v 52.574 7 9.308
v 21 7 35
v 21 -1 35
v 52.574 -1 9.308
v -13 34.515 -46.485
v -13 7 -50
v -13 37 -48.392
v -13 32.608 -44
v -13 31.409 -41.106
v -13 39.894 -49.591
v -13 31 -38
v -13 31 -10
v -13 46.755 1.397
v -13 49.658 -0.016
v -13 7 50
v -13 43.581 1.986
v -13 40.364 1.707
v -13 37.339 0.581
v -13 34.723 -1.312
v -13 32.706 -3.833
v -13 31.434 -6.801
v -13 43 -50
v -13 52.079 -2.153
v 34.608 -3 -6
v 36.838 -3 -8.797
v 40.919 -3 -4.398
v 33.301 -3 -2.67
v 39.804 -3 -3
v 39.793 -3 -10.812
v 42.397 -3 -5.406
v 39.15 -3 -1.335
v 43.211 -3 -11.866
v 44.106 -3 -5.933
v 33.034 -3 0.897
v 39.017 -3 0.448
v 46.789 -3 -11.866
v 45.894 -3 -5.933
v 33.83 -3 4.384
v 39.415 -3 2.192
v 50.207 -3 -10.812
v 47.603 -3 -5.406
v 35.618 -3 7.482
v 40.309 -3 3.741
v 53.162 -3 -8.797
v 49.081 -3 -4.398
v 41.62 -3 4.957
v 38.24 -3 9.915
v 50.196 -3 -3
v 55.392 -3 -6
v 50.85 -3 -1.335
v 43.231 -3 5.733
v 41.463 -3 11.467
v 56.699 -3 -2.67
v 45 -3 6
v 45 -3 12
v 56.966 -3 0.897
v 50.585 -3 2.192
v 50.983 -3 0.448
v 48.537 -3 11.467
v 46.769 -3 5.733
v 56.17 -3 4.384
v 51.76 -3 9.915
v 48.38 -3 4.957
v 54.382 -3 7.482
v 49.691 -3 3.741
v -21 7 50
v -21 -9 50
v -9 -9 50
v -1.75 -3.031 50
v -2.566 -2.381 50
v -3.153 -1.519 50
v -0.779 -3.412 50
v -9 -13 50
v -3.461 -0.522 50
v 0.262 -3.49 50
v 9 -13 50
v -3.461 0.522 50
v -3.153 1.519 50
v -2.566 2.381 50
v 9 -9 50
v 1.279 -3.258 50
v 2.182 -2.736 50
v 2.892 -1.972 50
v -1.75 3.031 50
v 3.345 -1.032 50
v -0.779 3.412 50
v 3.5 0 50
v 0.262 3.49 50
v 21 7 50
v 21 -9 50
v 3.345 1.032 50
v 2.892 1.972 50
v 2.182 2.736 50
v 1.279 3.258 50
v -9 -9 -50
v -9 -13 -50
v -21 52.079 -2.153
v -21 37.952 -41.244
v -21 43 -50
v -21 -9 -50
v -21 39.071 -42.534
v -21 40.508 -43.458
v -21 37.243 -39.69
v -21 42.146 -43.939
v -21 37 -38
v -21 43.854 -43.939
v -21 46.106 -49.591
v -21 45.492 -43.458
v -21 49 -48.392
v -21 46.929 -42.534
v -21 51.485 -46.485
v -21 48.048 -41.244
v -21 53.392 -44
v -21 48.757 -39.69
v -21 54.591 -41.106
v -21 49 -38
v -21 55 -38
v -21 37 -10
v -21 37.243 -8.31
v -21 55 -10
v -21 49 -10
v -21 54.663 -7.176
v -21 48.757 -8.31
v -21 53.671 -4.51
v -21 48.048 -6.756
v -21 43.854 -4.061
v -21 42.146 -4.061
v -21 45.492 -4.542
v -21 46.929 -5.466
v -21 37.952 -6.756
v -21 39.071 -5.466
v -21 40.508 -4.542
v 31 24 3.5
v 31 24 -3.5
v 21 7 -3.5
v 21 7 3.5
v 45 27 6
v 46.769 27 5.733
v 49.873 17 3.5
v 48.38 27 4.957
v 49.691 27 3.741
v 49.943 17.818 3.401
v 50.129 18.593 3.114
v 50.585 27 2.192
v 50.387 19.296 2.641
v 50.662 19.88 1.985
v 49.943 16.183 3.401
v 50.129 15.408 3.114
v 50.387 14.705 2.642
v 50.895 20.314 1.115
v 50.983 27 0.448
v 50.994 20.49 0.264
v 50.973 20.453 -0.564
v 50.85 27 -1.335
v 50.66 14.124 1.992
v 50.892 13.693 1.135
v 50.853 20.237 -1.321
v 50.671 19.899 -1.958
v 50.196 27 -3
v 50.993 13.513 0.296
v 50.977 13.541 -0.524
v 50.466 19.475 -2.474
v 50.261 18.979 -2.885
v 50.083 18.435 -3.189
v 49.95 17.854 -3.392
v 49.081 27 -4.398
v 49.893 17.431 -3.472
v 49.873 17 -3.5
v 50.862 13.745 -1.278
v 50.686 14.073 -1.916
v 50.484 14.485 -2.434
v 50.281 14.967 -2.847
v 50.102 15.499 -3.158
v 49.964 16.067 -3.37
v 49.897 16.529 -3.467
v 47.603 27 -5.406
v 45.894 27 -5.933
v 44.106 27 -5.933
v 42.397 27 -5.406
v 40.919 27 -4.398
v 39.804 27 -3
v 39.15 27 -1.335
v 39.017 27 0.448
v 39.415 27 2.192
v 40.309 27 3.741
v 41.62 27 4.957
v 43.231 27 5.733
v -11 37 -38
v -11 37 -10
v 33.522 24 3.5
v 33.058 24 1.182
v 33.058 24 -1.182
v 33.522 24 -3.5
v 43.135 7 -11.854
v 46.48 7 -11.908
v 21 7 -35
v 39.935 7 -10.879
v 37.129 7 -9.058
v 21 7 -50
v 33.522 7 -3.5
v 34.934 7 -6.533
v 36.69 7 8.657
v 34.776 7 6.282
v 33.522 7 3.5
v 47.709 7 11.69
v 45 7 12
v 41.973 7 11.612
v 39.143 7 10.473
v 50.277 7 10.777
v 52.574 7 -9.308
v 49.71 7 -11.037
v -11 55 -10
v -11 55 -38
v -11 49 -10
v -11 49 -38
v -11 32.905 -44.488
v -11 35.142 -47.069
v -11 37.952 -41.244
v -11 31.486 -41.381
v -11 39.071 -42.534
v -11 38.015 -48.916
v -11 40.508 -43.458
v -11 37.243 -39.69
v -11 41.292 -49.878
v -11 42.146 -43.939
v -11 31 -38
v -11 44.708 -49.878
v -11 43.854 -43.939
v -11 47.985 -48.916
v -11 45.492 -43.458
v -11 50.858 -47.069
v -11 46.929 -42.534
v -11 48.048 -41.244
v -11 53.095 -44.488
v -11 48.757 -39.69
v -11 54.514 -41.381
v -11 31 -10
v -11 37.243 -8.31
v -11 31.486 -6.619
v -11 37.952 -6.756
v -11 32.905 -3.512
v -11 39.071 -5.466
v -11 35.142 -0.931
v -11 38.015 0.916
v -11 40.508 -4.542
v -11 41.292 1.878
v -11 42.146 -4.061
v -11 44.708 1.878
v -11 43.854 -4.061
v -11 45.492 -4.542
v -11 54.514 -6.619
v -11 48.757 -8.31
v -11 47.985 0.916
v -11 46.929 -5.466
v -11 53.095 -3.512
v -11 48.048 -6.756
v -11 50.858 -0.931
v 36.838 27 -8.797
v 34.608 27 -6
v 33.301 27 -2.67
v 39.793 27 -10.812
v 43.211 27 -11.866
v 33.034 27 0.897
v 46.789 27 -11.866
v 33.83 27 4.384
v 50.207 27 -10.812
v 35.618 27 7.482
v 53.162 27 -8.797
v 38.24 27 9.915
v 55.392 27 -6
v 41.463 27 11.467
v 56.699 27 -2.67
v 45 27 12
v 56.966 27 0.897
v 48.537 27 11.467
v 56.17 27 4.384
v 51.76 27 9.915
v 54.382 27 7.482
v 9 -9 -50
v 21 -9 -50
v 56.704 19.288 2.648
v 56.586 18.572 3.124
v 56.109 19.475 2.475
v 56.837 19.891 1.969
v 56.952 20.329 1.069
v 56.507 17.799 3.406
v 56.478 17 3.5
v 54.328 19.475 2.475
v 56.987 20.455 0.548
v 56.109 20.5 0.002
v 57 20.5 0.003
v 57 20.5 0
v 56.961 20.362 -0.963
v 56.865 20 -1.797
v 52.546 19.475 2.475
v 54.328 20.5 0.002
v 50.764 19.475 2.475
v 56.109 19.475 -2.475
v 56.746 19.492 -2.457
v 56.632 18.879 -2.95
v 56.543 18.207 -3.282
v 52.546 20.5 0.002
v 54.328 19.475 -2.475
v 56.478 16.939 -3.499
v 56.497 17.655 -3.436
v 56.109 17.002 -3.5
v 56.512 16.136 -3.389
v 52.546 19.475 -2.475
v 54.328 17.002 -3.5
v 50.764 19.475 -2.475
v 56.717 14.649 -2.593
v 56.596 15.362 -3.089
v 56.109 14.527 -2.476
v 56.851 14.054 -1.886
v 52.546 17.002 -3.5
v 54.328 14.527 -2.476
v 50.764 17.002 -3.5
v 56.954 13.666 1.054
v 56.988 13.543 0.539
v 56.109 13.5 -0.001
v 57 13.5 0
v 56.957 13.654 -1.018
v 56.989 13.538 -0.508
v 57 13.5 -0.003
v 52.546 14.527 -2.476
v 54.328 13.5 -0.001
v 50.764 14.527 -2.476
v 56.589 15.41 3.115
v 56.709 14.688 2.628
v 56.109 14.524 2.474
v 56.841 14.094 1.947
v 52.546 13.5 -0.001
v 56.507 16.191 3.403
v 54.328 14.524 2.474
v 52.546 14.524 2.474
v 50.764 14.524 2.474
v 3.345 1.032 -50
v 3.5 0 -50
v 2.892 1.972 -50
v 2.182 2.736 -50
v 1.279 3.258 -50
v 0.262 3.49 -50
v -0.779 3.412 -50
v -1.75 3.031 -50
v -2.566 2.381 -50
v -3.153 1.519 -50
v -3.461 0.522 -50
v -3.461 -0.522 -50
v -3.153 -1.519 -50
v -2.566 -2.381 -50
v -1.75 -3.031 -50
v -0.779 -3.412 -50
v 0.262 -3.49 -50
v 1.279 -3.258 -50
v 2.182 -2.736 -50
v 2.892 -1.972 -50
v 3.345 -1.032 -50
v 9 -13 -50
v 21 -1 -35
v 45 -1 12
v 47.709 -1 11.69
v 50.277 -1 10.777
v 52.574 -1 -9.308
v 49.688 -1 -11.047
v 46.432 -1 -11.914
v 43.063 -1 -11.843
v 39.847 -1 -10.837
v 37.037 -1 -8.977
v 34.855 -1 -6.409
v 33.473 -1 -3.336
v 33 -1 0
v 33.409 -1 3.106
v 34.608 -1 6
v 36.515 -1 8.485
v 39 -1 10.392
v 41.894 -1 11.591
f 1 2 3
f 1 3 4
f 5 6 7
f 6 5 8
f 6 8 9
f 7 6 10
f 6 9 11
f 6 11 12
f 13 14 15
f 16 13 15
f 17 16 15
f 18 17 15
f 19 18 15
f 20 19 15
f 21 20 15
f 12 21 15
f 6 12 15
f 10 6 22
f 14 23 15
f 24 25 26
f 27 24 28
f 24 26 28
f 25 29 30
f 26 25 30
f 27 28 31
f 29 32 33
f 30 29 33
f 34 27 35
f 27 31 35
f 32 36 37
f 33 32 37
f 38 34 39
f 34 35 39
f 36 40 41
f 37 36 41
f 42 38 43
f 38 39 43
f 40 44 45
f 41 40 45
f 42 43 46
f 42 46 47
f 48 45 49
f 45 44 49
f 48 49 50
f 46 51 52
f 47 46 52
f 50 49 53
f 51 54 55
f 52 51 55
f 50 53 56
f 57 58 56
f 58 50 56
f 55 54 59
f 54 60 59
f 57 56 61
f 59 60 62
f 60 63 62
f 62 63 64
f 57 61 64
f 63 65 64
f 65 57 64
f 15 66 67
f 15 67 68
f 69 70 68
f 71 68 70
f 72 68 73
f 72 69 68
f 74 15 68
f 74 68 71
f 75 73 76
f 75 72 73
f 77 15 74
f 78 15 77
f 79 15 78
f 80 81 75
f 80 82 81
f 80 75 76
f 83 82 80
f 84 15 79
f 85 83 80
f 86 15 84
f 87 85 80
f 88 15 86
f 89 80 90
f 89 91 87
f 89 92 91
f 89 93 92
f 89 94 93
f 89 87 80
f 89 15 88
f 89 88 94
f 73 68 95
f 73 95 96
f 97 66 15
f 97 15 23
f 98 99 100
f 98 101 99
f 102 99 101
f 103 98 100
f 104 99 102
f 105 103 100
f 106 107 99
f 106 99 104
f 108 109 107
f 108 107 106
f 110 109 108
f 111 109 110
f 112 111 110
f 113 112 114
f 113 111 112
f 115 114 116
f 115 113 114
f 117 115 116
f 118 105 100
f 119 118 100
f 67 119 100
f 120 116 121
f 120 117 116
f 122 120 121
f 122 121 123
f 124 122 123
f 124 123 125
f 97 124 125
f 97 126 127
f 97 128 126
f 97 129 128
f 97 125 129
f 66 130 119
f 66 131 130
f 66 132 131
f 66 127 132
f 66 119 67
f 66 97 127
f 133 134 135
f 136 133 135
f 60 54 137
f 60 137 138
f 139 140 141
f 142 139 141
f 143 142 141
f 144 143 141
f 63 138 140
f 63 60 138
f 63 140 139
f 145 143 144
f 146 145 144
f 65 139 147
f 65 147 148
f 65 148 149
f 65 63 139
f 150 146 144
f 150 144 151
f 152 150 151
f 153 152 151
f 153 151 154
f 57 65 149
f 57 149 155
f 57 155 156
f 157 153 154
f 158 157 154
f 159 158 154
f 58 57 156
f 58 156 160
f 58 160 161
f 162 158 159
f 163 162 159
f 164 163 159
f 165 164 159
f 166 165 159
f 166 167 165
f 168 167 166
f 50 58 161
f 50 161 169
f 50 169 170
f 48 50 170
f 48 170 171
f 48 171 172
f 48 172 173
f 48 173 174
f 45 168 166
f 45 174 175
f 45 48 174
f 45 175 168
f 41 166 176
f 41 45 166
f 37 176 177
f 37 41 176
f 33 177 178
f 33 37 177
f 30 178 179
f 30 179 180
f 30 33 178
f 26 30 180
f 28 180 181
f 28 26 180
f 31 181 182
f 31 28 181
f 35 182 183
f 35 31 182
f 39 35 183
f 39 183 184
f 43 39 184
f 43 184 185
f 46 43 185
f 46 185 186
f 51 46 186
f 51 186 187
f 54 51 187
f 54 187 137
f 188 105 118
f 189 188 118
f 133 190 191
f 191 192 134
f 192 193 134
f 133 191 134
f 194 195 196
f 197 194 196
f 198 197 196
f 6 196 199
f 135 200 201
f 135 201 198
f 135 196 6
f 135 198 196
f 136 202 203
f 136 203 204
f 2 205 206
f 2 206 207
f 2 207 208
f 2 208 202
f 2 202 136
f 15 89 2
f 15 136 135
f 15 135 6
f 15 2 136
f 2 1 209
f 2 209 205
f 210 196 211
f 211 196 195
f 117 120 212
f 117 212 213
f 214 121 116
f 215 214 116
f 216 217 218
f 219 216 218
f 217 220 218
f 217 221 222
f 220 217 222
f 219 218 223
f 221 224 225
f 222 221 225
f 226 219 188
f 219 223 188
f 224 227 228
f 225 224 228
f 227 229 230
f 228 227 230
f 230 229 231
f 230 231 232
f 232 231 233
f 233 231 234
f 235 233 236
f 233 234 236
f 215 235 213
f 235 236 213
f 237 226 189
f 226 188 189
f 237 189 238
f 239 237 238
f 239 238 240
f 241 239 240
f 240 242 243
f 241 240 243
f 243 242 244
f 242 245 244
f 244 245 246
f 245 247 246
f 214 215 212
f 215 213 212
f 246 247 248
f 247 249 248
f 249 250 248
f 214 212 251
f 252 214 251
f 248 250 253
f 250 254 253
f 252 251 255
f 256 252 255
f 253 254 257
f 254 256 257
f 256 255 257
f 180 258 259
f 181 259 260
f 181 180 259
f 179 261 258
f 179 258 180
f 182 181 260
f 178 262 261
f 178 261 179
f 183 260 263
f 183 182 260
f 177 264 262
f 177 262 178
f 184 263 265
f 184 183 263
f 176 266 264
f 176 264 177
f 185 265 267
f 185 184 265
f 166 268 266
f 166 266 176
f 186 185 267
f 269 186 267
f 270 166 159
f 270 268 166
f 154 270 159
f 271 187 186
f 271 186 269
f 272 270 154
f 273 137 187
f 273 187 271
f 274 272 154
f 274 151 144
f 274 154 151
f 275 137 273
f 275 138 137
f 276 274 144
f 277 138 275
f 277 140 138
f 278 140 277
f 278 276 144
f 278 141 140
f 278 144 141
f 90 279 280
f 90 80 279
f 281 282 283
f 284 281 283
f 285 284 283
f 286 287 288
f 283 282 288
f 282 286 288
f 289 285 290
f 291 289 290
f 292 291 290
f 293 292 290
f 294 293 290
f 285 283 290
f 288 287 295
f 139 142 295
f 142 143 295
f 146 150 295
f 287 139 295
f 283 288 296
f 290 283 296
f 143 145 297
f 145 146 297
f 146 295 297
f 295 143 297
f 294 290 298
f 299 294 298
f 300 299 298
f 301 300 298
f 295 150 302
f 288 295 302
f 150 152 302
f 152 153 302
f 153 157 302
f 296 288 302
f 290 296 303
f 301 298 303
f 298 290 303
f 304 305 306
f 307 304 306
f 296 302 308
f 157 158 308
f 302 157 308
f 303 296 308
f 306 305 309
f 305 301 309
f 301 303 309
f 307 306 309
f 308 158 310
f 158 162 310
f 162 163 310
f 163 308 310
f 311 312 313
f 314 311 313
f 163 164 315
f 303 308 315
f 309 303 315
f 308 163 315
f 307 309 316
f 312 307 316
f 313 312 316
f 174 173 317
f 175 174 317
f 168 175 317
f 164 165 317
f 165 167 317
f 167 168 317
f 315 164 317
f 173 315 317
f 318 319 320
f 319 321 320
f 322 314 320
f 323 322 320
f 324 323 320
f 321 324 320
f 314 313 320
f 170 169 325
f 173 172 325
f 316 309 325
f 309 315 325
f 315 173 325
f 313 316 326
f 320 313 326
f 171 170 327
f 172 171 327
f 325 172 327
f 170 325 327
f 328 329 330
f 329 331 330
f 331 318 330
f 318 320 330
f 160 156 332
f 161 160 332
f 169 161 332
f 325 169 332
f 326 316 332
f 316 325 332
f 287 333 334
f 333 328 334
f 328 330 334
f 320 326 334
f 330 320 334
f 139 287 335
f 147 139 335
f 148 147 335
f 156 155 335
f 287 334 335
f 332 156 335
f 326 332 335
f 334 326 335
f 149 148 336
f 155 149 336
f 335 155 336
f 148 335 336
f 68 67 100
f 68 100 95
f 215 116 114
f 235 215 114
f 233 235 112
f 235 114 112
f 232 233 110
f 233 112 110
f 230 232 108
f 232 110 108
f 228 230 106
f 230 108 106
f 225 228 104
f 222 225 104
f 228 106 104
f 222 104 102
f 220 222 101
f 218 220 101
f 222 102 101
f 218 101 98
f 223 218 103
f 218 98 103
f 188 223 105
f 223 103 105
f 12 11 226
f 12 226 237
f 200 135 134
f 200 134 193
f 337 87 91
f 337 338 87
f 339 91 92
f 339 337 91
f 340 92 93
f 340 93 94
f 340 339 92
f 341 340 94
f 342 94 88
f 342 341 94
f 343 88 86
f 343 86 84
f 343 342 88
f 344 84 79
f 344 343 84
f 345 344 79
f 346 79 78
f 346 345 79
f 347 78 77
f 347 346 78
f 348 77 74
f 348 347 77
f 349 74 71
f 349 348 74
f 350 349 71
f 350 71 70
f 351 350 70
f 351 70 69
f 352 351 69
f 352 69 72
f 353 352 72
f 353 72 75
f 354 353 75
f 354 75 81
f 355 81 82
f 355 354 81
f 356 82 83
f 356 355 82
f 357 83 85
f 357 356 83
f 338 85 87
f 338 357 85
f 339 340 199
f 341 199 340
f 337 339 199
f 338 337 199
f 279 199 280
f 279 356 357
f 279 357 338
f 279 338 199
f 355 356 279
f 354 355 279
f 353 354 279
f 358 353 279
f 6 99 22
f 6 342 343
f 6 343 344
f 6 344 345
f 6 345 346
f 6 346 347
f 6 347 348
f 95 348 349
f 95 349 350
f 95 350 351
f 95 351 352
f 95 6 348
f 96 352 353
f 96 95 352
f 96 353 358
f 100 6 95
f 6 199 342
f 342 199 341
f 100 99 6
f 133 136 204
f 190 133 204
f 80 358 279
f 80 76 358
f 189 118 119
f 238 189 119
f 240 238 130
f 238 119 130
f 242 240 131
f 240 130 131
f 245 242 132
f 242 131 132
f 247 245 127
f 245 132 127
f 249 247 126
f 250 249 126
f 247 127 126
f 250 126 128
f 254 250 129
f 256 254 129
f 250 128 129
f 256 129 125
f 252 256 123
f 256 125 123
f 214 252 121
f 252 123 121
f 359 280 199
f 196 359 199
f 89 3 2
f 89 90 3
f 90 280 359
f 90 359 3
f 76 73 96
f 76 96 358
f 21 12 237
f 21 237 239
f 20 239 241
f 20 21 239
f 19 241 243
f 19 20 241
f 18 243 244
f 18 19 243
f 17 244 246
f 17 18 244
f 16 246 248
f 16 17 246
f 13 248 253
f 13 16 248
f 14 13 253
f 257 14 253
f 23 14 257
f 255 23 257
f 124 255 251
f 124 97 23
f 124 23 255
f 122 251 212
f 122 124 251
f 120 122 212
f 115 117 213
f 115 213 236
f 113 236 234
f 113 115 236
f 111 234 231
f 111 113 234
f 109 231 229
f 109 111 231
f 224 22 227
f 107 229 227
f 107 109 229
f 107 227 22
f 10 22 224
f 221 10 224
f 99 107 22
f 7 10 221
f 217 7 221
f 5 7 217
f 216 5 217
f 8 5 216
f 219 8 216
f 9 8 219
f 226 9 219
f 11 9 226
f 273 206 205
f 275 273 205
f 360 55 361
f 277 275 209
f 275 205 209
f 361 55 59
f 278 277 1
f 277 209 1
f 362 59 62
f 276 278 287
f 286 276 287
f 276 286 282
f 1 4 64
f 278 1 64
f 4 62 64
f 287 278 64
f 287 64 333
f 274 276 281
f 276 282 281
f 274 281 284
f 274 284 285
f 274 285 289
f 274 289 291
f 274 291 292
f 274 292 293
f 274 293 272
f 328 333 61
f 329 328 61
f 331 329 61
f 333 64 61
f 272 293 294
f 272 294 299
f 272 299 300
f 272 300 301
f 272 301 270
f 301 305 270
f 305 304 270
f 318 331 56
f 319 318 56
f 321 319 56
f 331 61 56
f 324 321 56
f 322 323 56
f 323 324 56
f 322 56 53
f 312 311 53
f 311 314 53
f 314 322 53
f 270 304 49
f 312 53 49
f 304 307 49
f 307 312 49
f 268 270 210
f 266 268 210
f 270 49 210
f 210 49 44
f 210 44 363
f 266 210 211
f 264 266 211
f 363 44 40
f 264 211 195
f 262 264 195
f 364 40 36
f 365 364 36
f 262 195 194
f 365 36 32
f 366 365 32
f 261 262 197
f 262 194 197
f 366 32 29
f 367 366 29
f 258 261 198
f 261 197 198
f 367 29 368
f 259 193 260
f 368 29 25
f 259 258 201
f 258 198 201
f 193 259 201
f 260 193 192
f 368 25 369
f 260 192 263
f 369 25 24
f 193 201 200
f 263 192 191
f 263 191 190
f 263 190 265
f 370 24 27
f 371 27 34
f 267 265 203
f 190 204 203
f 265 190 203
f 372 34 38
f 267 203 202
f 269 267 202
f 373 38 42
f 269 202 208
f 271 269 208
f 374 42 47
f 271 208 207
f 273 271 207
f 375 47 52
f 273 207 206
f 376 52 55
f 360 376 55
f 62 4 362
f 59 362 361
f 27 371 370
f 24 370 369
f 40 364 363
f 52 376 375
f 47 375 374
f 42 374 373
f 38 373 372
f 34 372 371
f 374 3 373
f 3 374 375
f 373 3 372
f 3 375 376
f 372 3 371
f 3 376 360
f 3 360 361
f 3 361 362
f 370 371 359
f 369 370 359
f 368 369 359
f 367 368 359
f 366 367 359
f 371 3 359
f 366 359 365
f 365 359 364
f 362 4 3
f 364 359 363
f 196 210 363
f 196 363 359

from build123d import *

# Parameters (mm, degrees)
SKETCH_1_R           = 3.5
EXTRUDE_1_DEPTH      = 50
EXTRUDE_2_DEPTH      = 8
EXTRUDE_3_DEPTH      = 10
EXTRUDE_4_DEPTH      = 8
EXTRUDE_5_DEPTH      = 20
EXTRUDE_5_DEPTH_BACK = 10
SKETCH_3_3_R         = 12
SKETCH_3_3_R_2       = 6
RIB_START            = -3.5
RIB_12_DEPTH         = 7
CUT_EXTRUDE_START    = 49.873397053
CUT_EXTRUDE_1_DEPTH  = 7.126602664


# Read off the part's stored shape, not the designer's step: 筋12, 切除-拉伸1
with BuildPart() as part:
    # 草图1 → 凸台-拉伸1 (new, symmetric)
    with BuildSketch(Plane.XY):
        Polygon((21, 7), (-21, 7), (-21, -9), (-9, -9), (-9, -13), (9, -13), (9, -9), (21, -9), align=None)
        Circle(SKETCH_1_R, mode=Mode.SUBTRACT)
    extrude(amount=EXTRUDE_1_DEPTH, both=True)

    # 草图2 → 凸台-拉伸2 (add)
    with BuildSketch(Plane.ZY.offset(21)):
        with BuildLine():
            Line((-50, 43), (-50, 7))
            Line((-50, 7), (50, 7))
            Line((50, 7), (-2.152816021, 52.078639964))
            ThreePointArc((-2.152816021, 52.078639964), (1.245969935, 38.813335431), (-10, 31))
            Line((-10, 31), (-38, 31))
            ThreePointArc((-38, 31), (-46.485281374, 34.514718626), (-50, 43))
        make_face()
    extrude(amount=-EXTRUDE_2_DEPTH)

    # 草图2<3> → 凸台-拉伸3 (add)
    with BuildSketch(Plane.ZY.offset(21)):
        with BuildLine():
            Line((-10, 55), (-38, 55))
            ThreePointArc((-38, 55), (-50, 43), (-38, 31))
            Line((-38, 31), (-10, 31))
            ThreePointArc((-10, 31), (2, 43), (-10, 55))
        make_face()
        with BuildLine():
            ThreePointArc((-38, 49), (-44, 43), (-38, 37))
            Line((-38, 37), (-10, 37))
            ThreePointArc((-10, 37), (-4, 43), (-10, 49))
            Line((-10, 49), (-38, 49))
        make_face(mode=Mode.SUBTRACT)
    extrude(amount=-EXTRUDE_3_DEPTH)

    # 草图3 → 凸台-拉伸4 (add)
    with BuildSketch(Plane(origin=(0, 7, 0), x_dir=(1, 0, 0), z_dir=(0, 1, 0))):
        with BuildLine():
            Line((33, 0), (21, 0))
            Line((21, 0), (21, -35))
            Line((21, -35), (52.573920737, -9.307831362))
            ThreePointArc((52.573920737, -9.307831362), (39.846702456, -10.837136357), (33, 0))
        make_face()
        with BuildLine():
            Line((21, 35), (21, 0))
            Line((21, 0), (33, 0))
            ThreePointArc((33, 0), (39.846702456, 10.837136357), (52.573920737, 9.307831362))
            Line((52.573920737, 9.307831362), (21, 35))
        make_face()
    extrude(amount=-EXTRUDE_4_DEPTH)

    # 草图3<3> → 凸台-拉伸5 (add, two sides: drawn at the far end of the back side and taken through both)
    with BuildSketch(Plane(origin=(0, 7, 0), x_dir=(1, 0, 0), z_dir=(0, 1, 0)).offset(-EXTRUDE_5_DEPTH_BACK)):
        with Locations(Location((45, 0, 0), (0, 0, 270))):
            Circle(SKETCH_3_3_R)
        with Locations(Location((45, 0, 0), (0, 0, 270))):
            Circle(SKETCH_3_3_R_2, mode=Mode.SUBTRACT)
    extrude(amount=EXTRUDE_5_DEPTH + EXTRUDE_5_DEPTH_BACK)

    # 筋12 outline → 筋12 (add)
    with BuildSketch(Plane.XY.offset(RIB_START)):
        Polygon((35, 24), (31, 24), (21, 7), (35, 7), align=None)
    extrude(amount=RIB_12_DEPTH)

    # 切除-拉伸1 outline → 切除-拉伸1 (cut)
    with BuildSketch(Plane(origin=(0, 0, 0), x_dir=(0, 0, -1), z_dir=(1, 0, 0)).offset(CUT_EXTRUDE_START)):
        with BuildLine():
            add(Edge.make_bspline(
                [(-3.5, 17), (-3.5, 17.930374798), (-3.116526668, 18.833354303), (-1.832705903, 20.11690801), (-0.921038324, 20.499404533), (0.916507131, 20.500594001), (1.828824497, 20.121110709), (3.121641798, 18.827917827), (3.499603295, 17.918268751), (3.500396051, 16.084757844), (3.121933694, 15.173019649), (1.831002297, 13.880423461), (0.924027469, 13.500295231), (-0.921789584, 13.499705127), (-1.831835104, 13.88257801), (-3.116022585, 15.165785464), (-3.5, 16.069625202), (-3.5, 17)],
                knots=[0, 0, 0, 0, 0.125, 0.125, 0.25, 0.25, 0.375, 0.375, 0.5, 0.5, 0.625, 0.625, 0.75, 0.75, 0.875, 0.875, 1, 1, 1, 1], degree=3))
        make_face()
    extrude(amount=CUT_EXTRUDE_1_DEPTH, mode=Mode.SUBTRACT)


solid = part.part
